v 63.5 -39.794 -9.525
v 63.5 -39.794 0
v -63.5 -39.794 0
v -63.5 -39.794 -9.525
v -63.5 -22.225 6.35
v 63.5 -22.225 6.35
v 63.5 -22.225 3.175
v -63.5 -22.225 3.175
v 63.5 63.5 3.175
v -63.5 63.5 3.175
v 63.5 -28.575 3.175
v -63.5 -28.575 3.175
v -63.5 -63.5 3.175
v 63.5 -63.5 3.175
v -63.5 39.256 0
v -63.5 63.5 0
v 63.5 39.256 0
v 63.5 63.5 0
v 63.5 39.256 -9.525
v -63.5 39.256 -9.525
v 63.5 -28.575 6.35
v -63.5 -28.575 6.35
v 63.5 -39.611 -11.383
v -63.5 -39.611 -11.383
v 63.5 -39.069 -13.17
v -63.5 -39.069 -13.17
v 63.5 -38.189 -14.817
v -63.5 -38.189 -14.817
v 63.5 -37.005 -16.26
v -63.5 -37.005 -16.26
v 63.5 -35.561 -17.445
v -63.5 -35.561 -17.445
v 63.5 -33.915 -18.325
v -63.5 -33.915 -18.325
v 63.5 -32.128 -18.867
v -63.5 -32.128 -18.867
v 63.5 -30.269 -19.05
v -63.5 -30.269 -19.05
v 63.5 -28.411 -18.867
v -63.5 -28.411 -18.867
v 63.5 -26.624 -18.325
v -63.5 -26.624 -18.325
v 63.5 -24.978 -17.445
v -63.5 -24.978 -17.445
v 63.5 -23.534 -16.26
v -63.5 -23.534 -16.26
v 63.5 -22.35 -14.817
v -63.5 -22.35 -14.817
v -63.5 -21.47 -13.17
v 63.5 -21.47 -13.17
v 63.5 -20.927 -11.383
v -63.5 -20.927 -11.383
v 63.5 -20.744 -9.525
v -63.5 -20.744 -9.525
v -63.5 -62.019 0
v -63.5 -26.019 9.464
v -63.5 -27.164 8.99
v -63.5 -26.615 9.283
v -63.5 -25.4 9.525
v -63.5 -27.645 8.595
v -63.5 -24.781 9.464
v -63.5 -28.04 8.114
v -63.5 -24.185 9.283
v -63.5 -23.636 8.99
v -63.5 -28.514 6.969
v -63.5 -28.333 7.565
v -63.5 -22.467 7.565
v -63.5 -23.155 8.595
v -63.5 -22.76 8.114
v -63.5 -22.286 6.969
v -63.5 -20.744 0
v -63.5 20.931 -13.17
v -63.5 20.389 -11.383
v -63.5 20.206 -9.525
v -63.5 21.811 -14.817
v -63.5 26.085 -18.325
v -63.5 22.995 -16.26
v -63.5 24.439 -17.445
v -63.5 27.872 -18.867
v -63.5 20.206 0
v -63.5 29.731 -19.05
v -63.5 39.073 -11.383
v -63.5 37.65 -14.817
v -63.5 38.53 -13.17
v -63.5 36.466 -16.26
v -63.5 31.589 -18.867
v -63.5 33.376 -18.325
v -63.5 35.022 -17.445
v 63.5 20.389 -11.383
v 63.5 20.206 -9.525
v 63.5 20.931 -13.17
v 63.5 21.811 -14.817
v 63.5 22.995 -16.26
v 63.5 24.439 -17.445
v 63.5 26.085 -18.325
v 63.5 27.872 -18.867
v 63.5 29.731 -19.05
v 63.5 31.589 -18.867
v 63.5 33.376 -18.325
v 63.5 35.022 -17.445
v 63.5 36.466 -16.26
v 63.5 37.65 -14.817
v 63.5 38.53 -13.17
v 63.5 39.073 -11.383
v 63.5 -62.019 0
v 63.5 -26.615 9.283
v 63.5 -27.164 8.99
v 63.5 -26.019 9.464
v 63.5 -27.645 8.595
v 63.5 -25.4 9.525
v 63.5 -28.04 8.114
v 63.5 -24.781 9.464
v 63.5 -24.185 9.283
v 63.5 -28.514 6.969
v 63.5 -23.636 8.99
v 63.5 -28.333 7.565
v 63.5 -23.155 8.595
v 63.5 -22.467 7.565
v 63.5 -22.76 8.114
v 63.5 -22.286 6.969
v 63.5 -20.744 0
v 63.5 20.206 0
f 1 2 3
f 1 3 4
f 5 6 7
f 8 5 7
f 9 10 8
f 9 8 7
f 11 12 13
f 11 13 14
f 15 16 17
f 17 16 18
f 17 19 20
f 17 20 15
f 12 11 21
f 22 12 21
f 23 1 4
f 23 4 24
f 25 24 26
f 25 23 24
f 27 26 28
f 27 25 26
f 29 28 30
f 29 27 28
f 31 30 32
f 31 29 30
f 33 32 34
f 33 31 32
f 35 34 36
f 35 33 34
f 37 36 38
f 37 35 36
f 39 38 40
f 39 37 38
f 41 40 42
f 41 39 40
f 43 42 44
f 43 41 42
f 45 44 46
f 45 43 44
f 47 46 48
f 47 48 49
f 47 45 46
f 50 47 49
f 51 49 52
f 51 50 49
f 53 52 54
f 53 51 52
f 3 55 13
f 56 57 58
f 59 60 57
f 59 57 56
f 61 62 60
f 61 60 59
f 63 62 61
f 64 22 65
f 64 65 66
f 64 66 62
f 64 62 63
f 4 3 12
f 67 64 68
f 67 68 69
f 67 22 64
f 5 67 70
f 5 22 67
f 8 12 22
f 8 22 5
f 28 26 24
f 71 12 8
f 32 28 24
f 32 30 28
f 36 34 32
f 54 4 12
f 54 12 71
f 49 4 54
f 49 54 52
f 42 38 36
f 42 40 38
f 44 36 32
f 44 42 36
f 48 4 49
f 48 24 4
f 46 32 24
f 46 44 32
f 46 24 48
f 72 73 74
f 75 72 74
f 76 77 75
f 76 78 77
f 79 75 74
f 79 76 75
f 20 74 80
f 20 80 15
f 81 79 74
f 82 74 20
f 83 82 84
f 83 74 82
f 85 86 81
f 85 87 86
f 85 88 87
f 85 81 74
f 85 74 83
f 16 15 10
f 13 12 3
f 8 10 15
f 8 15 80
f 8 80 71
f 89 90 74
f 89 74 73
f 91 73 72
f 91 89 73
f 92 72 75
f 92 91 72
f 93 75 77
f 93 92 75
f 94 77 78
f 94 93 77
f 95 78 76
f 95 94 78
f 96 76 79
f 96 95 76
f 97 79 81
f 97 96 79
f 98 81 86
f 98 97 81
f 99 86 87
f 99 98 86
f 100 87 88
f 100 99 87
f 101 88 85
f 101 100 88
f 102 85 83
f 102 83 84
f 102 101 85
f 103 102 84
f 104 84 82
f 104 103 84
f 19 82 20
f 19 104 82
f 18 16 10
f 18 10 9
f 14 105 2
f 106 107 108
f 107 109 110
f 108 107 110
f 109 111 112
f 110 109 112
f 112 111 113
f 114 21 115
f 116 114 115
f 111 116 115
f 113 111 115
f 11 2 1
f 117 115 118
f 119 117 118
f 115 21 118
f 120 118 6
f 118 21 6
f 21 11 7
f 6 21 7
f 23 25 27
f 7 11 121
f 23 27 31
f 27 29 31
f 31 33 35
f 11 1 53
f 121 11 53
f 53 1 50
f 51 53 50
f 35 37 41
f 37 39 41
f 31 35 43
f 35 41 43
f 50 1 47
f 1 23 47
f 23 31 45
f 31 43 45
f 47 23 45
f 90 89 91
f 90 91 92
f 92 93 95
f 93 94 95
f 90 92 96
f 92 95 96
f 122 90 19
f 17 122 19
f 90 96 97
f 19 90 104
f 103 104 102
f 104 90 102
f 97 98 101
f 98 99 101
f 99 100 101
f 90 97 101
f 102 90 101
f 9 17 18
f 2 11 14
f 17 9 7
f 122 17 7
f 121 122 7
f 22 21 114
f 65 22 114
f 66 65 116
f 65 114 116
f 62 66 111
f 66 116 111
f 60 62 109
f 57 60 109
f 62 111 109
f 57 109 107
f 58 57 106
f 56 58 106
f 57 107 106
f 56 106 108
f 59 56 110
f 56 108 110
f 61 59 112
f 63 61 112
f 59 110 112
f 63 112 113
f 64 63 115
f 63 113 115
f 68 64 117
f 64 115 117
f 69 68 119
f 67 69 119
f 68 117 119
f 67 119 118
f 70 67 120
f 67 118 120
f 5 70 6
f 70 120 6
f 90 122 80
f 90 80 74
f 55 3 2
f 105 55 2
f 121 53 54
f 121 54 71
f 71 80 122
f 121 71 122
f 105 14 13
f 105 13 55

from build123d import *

# Parameters (mm, degrees)
SKETCH1_W           = 127
SKETCH1_H           = 127
BOSS_EXTRUDE1_DEPTH = 3.175
CUT_EXTRUDE1_DEPTH  = 143.025809714
BOSS_EXTRUDE3_DEPTH = 127
BOSS_EXTRUDE4_DEPTH = 127


with BuildPart() as part:
    # Sketch1 → Boss-Extrude1 (new body)
    with BuildSketch(Plane.XY):
        Rectangle(SKETCH1_W, SKETCH1_H)
    extrude(amount=BOSS_EXTRUDE1_DEPTH)

    # Sketch2 → Cut-Extrude1 (cut, through all)
    with BuildSketch(Plane(origin=(63.5, 0, 0), x_dir=(0, 0, -1), z_dir=(1, 0, 0))):
        Polygon((-3.175, -63.5), (0, -62.019473185), (0, -63.5), align=None)
    extrude(amount=-CUT_EXTRUDE1_DEPTH, mode=Mode.SUBTRACT)

    # Sketch3 → Boss-Extrude3 (add)
    with BuildSketch(Plane(origin=(63.5, 0, 0), x_dir=(0, 0, -1), z_dir=(1, 0, 0))):
        with BuildLine():
            Line((9.525, 39.255526815), (0, 39.255526815))
            Line((0, 39.255526815), (0, 20.205526815))
            Line((0, 20.205526815), (9.525, 20.205526815))
            ThreePointArc((9.525, 20.205526815), (19.05, 29.730526815), (9.525, 39.255526815))
        make_face()
        with BuildLine():
            Line((9.525, -20.744473185), (0, -20.744473185))
            Line((0, -20.744473185), (0, -39.794473185))
            Line((0, -39.794473185), (9.525, -39.794473185))
            ThreePointArc((9.525, -39.794473185), (19.05, -30.269473185), (9.525, -20.744473185))
        make_face()
    extrude(amount=-BOSS_EXTRUDE3_DEPTH)

    # Sketch4 → Boss-Extrude4 (add)
    with BuildSketch(Plane(origin=(63.5, 0, 0), x_dir=(0, 0, -1), z_dir=(1, 0, 0))):
        with BuildLine():
            Line((-6.35, -22.225), (-3.175, -22.225))
            Line((-3.175, -22.225), (-3.175, -28.575))
            Line((-3.175, -28.575), (-6.35, -28.575))
            ThreePointArc((-6.35, -28.575), (-9.525, -25.4), (-6.35, -22.225))
        make_face()
    extrude(amount=-BOSS_EXTRUDE4_DEPTH)


solid = part.part
